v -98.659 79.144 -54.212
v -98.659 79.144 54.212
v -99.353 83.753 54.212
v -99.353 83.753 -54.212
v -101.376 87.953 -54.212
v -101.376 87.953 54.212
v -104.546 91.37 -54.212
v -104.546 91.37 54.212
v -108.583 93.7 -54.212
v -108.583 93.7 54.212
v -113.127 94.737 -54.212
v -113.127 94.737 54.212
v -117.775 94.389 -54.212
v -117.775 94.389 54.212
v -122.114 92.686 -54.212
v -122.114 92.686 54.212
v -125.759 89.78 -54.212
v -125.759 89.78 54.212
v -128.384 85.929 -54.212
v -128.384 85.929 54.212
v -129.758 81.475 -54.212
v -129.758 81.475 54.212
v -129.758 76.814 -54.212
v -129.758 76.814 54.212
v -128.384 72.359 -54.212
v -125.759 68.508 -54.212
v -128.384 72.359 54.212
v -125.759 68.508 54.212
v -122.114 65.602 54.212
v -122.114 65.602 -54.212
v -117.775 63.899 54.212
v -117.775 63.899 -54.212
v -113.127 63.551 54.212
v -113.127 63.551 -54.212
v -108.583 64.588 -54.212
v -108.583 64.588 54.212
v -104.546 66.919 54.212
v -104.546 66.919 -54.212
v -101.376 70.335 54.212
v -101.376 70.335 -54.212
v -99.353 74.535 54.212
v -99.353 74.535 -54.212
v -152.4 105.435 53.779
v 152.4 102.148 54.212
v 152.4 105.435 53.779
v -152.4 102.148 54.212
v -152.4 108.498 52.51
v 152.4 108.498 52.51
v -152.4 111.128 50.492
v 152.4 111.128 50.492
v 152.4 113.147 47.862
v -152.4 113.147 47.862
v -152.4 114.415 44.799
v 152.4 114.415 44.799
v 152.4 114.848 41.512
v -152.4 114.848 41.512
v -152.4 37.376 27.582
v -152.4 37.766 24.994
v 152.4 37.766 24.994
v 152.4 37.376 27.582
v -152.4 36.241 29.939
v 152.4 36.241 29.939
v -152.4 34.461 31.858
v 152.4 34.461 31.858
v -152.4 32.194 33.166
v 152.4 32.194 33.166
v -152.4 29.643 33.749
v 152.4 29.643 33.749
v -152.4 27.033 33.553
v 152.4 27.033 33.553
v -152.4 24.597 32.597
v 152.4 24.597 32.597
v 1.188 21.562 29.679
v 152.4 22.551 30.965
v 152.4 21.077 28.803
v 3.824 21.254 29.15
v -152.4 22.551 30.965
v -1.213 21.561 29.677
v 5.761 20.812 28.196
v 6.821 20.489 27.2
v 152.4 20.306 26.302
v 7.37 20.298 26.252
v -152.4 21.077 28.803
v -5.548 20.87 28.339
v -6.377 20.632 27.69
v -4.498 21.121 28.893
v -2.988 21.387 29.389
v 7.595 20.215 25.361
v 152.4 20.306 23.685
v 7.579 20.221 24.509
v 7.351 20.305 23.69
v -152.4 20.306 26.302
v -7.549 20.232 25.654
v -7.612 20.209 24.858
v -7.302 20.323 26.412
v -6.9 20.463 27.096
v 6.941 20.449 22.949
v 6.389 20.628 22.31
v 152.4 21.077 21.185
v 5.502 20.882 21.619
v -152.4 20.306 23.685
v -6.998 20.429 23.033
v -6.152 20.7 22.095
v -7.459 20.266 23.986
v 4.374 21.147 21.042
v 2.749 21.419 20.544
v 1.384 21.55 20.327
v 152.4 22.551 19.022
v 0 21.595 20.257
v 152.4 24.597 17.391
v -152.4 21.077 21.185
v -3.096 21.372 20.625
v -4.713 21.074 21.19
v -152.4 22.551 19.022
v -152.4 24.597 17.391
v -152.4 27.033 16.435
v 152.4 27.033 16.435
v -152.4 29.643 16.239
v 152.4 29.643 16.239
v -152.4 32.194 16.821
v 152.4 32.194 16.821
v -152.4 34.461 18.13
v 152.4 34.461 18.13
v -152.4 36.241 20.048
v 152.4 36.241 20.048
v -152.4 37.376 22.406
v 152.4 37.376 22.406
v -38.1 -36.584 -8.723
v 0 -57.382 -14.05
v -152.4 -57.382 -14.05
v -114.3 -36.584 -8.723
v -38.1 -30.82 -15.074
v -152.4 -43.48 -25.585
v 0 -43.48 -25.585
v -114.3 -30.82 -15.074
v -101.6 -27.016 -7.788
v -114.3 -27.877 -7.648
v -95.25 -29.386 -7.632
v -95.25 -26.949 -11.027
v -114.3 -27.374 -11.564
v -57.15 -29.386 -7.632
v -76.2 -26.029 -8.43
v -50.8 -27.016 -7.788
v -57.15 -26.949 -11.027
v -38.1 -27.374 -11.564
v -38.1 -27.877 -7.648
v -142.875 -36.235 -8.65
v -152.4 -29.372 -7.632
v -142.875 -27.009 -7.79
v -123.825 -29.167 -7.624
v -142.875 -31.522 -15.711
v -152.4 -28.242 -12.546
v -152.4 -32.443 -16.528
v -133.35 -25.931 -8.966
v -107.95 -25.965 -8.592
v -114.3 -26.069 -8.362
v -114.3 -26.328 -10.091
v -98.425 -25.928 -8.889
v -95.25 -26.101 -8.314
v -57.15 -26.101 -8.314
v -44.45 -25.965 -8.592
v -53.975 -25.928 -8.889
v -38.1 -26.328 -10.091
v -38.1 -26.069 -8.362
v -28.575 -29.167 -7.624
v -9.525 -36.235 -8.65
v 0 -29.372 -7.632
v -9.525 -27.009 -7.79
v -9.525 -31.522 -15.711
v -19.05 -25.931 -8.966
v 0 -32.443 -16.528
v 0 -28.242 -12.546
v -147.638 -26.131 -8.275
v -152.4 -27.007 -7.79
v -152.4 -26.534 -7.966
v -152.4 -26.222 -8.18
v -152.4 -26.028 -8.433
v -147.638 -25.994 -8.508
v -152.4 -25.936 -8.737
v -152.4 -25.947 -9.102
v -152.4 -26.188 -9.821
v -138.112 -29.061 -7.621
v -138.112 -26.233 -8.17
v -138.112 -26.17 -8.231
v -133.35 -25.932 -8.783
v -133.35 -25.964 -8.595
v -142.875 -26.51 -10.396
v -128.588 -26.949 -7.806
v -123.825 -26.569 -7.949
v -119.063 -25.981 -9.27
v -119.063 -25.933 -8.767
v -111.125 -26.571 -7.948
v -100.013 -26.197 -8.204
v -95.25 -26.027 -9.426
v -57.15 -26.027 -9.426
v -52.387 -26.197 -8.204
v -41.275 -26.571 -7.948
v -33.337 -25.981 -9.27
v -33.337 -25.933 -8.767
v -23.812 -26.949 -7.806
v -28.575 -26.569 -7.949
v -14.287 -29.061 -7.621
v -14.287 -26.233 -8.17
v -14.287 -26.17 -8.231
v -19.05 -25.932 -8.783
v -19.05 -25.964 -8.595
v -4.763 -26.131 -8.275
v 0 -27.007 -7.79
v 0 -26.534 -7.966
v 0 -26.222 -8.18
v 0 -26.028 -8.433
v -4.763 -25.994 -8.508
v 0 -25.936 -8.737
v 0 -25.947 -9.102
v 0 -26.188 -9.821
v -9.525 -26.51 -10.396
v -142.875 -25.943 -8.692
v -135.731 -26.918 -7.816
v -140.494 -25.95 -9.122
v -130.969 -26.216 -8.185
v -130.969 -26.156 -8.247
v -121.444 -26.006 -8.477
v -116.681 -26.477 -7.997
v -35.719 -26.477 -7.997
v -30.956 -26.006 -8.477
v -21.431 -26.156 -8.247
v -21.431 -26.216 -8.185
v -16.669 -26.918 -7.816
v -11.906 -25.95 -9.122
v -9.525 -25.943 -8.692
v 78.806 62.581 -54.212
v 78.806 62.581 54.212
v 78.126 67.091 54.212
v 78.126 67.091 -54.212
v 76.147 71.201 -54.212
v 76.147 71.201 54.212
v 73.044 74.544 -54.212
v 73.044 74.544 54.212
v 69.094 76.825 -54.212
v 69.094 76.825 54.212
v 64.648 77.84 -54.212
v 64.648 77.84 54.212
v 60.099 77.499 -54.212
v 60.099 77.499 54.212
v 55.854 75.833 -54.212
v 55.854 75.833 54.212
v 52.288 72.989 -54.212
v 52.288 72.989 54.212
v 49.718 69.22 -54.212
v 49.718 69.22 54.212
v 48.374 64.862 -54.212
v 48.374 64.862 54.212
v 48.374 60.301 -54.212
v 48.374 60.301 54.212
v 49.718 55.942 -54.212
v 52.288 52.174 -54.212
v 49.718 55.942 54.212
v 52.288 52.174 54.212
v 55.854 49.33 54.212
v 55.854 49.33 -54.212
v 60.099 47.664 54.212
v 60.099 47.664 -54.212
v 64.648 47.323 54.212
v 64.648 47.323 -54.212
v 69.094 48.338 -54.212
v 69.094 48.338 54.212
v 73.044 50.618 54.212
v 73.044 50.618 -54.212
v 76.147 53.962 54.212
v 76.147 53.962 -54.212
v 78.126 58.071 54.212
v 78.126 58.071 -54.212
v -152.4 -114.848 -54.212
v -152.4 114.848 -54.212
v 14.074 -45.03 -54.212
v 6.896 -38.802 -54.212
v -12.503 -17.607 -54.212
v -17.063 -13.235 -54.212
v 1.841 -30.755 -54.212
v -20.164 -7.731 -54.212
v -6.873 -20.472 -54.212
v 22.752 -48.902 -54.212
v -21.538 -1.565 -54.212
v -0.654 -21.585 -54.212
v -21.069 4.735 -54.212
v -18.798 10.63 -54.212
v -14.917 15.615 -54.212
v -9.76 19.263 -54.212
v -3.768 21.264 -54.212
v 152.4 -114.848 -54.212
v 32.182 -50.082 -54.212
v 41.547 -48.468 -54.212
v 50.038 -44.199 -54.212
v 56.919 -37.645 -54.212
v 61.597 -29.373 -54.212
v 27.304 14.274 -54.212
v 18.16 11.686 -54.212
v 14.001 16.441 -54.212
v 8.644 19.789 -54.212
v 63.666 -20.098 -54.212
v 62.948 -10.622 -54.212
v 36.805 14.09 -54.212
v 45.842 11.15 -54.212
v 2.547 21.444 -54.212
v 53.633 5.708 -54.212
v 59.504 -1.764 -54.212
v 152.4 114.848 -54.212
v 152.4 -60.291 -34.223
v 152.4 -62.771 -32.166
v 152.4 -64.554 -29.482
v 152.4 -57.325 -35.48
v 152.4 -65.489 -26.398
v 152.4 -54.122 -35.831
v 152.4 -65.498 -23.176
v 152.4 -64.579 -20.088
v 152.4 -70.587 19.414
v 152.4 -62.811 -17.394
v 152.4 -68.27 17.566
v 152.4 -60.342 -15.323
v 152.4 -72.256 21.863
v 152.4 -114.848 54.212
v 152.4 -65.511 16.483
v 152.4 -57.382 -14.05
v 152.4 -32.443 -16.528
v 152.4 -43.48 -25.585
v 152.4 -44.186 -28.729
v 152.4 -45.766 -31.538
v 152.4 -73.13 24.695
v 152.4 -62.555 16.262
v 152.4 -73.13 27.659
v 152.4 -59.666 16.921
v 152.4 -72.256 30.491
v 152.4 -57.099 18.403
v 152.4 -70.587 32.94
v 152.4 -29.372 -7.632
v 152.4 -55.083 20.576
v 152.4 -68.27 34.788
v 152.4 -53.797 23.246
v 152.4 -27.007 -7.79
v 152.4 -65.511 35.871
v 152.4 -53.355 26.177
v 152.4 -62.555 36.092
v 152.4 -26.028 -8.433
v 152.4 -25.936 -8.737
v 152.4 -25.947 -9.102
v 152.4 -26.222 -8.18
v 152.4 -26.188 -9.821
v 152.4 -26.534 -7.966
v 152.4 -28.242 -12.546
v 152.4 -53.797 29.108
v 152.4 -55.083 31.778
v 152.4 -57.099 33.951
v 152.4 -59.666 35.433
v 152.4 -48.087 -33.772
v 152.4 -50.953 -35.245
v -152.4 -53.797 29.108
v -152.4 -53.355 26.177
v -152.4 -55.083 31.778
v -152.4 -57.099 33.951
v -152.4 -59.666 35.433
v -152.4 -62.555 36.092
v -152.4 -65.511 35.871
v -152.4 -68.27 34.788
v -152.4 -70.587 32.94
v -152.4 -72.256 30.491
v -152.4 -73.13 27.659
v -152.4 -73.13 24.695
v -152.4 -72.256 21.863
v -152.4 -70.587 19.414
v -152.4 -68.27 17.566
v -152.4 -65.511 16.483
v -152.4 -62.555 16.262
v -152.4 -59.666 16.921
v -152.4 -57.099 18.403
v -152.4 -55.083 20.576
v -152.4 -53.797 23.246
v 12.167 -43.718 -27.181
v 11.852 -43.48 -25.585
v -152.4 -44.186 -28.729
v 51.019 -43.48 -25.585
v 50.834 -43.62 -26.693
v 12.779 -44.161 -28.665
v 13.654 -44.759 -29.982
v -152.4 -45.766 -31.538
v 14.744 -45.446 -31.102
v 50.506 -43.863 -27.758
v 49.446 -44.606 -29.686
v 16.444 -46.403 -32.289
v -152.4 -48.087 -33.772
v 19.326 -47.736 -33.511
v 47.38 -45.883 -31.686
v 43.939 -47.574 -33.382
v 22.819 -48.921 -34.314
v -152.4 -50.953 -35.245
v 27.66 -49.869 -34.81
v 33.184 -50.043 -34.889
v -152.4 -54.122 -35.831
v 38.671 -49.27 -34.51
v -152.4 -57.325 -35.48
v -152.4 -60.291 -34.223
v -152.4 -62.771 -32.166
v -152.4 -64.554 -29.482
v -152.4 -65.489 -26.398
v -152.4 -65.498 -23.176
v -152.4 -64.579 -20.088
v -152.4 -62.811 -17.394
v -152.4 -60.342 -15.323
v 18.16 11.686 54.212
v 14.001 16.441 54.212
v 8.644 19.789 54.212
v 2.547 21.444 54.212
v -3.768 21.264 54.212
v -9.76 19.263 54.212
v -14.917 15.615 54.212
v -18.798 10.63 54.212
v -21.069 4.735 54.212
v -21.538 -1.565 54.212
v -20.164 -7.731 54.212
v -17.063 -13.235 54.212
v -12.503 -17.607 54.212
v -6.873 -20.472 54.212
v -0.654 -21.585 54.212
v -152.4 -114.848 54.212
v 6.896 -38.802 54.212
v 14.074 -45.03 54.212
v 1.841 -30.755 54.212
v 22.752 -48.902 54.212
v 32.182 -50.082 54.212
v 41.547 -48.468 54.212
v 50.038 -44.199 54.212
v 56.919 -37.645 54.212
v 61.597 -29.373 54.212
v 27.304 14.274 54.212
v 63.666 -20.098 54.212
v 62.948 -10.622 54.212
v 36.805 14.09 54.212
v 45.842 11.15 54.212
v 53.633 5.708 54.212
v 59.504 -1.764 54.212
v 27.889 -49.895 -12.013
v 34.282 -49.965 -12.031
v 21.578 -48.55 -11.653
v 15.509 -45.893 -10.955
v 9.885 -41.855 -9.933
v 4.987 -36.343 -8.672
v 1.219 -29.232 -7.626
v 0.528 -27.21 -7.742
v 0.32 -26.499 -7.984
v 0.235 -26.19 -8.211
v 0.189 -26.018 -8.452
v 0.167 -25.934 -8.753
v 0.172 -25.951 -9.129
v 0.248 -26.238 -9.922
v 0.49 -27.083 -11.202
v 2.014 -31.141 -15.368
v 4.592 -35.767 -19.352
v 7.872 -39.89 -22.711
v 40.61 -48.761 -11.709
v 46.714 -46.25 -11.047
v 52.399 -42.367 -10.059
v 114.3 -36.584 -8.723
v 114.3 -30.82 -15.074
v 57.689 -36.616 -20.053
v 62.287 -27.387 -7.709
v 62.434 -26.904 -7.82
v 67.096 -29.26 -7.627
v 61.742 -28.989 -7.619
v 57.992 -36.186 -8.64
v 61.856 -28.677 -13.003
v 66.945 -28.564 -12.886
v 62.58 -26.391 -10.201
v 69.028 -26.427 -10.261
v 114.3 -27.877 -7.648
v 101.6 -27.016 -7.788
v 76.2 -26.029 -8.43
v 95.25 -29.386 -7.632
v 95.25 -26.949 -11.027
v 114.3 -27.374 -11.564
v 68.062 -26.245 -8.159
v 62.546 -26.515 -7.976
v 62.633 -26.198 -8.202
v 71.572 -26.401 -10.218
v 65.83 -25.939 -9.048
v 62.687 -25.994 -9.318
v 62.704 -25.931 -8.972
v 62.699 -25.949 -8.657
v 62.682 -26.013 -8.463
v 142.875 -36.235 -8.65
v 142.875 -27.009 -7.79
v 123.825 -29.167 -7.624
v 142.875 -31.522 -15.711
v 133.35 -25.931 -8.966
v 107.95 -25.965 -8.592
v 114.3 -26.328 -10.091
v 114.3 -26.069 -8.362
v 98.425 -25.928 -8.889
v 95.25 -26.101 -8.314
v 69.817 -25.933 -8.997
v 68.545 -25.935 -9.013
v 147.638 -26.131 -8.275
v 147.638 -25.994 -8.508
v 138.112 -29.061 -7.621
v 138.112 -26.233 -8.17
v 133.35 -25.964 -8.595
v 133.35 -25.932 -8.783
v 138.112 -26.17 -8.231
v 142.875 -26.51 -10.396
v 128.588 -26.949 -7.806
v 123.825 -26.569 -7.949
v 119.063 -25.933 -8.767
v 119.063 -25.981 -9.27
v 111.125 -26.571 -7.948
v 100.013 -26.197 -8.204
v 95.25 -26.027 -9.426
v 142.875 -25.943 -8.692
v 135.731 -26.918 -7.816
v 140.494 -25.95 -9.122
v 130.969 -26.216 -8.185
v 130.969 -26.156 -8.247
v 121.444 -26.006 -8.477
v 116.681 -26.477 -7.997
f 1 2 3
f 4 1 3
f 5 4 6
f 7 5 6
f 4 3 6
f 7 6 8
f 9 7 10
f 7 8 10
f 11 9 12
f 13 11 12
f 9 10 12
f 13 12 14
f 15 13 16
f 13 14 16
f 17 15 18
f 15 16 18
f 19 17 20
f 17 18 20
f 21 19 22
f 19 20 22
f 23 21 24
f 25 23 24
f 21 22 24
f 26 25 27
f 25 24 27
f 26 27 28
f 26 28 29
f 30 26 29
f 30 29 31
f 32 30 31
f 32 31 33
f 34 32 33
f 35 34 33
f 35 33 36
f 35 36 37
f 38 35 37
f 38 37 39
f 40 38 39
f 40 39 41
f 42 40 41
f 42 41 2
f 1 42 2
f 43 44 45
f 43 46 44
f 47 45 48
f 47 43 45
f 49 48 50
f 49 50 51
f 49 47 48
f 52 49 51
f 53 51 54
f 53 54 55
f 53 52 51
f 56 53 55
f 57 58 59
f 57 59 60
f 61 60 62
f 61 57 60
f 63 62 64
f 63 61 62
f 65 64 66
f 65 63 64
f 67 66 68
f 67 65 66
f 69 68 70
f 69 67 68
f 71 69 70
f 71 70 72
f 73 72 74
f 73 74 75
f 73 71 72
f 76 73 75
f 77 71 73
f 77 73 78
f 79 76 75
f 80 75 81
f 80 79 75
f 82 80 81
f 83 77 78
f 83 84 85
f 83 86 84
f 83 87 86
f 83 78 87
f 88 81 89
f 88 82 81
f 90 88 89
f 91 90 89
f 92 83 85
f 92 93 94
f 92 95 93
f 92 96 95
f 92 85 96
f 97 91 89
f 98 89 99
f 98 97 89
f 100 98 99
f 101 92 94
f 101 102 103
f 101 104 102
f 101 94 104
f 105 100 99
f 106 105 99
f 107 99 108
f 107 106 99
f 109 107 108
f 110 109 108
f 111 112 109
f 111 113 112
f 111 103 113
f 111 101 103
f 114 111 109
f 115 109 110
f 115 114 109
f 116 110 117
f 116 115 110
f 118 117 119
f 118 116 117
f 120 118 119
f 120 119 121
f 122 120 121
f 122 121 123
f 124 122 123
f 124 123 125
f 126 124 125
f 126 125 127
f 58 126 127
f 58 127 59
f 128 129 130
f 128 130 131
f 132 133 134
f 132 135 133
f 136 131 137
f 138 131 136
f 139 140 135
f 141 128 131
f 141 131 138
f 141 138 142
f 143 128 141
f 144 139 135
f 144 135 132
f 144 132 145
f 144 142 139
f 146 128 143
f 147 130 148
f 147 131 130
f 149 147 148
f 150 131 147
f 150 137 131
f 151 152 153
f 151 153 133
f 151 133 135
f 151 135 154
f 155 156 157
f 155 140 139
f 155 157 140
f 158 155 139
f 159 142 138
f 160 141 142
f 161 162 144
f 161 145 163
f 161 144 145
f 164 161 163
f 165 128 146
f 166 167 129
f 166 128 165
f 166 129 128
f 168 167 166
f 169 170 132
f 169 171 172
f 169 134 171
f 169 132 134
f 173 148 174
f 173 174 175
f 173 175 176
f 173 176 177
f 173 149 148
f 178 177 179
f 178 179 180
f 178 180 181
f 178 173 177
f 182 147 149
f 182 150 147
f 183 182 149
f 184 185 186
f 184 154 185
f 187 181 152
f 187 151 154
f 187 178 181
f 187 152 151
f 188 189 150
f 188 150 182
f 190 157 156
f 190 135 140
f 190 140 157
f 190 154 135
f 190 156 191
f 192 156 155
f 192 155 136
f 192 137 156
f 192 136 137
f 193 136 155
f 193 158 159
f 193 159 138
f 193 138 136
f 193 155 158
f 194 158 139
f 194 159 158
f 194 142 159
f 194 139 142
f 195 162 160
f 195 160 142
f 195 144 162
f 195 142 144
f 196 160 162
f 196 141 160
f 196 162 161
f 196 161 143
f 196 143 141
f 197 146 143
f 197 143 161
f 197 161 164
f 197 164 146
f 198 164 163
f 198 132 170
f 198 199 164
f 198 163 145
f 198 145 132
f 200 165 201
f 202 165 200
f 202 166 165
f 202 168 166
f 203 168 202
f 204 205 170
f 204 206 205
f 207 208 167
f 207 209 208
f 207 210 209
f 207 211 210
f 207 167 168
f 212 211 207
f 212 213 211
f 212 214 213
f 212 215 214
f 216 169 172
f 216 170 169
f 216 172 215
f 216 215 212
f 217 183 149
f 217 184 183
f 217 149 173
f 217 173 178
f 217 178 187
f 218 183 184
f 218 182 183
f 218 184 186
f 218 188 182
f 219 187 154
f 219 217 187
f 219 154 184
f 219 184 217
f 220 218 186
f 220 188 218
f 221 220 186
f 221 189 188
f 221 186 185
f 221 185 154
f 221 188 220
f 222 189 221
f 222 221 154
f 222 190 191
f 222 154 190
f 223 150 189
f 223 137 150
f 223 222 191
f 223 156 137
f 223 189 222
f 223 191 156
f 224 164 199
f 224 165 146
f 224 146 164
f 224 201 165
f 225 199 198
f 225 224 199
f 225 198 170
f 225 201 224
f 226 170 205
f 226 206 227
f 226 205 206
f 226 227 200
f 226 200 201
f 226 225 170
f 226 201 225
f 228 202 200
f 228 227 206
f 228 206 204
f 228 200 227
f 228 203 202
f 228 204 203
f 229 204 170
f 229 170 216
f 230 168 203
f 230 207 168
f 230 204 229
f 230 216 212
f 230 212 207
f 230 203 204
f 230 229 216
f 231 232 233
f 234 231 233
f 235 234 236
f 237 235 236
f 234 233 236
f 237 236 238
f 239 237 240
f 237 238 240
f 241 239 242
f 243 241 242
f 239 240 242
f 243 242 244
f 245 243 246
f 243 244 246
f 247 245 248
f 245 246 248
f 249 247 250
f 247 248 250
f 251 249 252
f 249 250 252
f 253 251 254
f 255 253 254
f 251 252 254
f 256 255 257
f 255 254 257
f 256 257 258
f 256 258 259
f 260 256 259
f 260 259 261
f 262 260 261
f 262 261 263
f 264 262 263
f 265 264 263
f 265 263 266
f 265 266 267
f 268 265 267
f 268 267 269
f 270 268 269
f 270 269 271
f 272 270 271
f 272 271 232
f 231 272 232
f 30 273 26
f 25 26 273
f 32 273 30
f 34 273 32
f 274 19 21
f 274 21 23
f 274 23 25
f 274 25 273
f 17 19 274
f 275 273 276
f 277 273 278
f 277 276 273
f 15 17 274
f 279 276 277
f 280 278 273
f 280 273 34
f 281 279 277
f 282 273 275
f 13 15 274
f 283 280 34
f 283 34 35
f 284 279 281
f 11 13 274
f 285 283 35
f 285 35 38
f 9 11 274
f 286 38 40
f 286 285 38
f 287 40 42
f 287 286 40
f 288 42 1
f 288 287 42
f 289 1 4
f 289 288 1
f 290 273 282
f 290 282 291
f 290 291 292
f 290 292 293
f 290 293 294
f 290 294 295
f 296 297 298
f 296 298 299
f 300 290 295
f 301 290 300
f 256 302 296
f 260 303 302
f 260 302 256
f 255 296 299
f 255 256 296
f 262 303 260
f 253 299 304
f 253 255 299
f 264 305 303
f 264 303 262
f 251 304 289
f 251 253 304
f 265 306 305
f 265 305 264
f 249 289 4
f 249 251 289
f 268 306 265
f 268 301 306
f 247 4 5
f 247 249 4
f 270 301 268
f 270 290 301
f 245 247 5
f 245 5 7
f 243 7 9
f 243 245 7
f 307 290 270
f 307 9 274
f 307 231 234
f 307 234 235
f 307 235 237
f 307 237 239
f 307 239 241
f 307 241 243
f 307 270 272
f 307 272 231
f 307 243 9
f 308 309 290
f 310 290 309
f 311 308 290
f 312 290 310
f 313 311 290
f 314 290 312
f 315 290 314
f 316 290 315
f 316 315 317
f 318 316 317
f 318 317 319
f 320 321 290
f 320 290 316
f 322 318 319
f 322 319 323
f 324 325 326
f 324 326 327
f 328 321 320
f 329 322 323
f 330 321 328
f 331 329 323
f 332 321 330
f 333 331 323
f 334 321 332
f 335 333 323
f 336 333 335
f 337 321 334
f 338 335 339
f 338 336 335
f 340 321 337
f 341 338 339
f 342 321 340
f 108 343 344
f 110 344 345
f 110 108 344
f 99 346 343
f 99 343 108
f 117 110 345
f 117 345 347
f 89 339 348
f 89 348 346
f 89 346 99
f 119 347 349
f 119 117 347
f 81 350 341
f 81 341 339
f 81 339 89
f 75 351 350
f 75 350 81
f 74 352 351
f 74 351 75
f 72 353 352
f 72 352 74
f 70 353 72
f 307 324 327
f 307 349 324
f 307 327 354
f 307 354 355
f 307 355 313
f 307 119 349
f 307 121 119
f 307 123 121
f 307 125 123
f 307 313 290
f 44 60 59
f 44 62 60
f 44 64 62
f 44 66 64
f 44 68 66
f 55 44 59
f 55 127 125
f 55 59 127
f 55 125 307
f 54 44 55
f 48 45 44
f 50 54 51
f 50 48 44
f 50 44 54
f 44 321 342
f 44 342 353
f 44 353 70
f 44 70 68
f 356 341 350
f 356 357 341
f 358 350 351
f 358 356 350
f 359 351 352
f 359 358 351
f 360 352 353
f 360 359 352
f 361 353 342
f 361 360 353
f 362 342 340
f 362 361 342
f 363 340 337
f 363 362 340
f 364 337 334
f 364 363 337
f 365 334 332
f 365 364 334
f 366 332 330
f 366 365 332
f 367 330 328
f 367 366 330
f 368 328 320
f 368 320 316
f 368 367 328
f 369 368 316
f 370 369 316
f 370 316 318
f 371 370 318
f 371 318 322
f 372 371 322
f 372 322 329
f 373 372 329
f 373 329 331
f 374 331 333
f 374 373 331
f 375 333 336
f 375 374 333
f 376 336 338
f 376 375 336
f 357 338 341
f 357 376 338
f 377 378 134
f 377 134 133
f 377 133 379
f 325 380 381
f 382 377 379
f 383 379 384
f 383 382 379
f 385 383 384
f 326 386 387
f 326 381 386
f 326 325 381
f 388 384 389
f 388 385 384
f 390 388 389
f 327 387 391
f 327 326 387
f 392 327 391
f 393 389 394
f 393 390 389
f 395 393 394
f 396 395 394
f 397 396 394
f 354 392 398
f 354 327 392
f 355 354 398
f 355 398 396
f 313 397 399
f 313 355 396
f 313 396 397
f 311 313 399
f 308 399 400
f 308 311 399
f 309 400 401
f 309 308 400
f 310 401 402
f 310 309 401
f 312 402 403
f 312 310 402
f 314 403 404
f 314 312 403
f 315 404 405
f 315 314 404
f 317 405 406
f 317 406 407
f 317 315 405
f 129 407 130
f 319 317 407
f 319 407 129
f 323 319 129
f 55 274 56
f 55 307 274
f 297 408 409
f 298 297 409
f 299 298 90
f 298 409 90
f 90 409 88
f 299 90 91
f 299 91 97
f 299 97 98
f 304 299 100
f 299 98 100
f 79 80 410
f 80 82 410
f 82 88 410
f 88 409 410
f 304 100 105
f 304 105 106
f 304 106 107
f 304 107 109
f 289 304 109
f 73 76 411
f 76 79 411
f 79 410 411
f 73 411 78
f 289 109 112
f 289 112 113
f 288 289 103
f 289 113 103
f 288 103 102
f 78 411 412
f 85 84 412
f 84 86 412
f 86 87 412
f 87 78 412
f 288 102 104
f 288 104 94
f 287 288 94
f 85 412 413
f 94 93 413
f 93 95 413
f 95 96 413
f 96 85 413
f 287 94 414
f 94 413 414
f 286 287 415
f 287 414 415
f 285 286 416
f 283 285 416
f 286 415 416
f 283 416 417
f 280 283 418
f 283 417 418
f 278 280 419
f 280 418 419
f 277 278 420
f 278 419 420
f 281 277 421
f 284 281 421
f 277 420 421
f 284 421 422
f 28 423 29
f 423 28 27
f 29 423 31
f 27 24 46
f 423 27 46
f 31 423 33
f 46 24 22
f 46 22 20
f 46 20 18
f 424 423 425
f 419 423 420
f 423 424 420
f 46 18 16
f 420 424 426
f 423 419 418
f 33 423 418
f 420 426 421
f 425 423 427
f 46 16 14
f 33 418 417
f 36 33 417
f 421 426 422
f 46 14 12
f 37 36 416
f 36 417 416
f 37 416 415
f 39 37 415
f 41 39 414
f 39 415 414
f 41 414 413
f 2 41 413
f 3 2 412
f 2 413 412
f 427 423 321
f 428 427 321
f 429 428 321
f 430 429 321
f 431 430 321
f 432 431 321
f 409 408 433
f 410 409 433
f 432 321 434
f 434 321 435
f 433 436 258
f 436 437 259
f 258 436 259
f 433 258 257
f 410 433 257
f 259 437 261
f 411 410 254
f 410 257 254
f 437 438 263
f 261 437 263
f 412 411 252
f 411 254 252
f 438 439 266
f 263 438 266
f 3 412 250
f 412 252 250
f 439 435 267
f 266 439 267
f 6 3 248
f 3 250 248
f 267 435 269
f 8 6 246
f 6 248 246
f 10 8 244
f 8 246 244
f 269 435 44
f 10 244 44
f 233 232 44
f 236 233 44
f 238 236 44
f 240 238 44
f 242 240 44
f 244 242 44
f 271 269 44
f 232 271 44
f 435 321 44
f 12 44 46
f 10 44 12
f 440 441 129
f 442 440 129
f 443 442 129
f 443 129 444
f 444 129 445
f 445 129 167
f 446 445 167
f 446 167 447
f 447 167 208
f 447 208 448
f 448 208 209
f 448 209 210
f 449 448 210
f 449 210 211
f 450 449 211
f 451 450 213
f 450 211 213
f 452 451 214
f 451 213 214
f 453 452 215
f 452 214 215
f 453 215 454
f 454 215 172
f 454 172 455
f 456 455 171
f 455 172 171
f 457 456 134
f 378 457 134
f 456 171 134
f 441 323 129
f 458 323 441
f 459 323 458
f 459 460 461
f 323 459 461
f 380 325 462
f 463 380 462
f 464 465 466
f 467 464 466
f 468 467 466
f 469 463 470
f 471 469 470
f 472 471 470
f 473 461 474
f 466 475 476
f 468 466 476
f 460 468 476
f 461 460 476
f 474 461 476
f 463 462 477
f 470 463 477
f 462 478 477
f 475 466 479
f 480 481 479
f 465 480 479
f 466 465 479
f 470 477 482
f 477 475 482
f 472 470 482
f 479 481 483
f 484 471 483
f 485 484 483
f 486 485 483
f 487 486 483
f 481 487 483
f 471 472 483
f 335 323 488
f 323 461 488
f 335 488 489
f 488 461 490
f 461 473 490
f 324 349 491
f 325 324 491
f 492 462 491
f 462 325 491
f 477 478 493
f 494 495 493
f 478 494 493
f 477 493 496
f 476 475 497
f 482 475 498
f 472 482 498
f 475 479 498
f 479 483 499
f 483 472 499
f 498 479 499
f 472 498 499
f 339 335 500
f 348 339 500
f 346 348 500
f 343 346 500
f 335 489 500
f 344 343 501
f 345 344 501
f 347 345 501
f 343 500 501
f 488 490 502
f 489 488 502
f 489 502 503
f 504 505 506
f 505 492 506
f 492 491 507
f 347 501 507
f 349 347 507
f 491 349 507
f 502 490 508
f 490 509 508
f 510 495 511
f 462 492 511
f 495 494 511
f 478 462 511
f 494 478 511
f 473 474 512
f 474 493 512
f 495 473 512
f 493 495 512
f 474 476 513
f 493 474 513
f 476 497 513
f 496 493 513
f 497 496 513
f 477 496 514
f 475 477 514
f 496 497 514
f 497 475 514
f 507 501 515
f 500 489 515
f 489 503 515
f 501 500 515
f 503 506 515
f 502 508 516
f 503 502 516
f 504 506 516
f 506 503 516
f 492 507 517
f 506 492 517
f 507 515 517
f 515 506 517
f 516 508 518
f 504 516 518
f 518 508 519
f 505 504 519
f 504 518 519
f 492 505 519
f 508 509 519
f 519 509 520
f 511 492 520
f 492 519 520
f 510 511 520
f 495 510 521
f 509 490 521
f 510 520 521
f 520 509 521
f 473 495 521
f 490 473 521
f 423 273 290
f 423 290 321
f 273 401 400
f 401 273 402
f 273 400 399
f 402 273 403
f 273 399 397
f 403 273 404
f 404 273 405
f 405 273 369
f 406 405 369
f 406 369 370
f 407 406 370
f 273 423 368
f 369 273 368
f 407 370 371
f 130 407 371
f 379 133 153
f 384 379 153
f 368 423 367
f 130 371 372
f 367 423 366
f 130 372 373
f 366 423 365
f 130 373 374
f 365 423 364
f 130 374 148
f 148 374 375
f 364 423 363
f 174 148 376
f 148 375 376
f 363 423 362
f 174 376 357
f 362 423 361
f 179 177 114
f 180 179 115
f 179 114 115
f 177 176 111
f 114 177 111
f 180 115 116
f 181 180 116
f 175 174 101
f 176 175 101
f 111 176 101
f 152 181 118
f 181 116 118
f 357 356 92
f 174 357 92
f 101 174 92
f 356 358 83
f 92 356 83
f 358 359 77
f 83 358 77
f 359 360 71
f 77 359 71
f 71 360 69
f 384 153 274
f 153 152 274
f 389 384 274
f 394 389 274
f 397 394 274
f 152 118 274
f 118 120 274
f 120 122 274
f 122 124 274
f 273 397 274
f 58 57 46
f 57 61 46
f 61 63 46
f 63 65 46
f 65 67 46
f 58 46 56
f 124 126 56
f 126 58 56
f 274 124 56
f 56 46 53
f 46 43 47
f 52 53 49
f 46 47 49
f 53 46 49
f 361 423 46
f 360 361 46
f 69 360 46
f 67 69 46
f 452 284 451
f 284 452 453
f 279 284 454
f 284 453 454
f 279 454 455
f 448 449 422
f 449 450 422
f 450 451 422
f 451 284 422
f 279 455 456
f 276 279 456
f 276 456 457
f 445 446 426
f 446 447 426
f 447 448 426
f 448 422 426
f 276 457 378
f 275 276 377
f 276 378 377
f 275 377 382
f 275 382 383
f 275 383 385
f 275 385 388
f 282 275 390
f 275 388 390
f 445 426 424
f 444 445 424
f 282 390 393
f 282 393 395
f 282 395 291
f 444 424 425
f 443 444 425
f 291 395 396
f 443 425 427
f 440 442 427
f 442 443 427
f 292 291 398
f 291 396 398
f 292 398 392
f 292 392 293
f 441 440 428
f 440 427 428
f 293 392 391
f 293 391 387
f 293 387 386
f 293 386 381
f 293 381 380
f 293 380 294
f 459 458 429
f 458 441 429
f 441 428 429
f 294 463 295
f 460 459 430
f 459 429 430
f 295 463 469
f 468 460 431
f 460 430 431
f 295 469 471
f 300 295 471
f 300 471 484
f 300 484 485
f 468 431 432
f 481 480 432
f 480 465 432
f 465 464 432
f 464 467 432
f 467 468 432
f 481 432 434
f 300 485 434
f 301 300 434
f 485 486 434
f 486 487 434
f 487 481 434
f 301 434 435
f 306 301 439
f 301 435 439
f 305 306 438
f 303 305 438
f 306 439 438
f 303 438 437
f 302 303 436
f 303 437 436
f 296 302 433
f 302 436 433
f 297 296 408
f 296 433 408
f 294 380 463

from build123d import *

# Parameters (mm, degrees)
F0_W     = 229.6963825016
F0_H     = 108.4231149972
F0_R     = 9.942969978
F0_R_2   = 8.7794022154
F1_DEPTH = 152.4
F2_R     = 15.637009349
F2_R_2   = 15.3013139209
F3_DEPTH = 108.4241150972
F4_R     = 12.7


with BuildPart() as f1:
    # F0 (on Right) → F1 (new body, symmetric)
    with BuildSketch(Plane.YZ):
        Rectangle(F0_W, F0_H)
        with BuildLine():
            ThreePointArc((-43.4804819524, -25.5854520947), (-61.6064477727, -33.2849477454), (-57.3824048042, -14.049815014))
            add(Edge.make_bspline(
                [(-57.3824048042, -14.049815014), (-42.3782414018, -9.9389745723), (-14.222776702, -2.224940818), (-34.1653761162, -18.1479024622), (-43.4804819524, -25.5854520947)],
                knots=[0, 0, 0, 0, 0.5329041294, 1, 1, 1, 1], degree=3))
        make_face(mode=Mode.SUBTRACT)
        with Locations((-63.2981136441, 26.1770226061)):
            Circle(F0_R, mode=Mode.SUBTRACT)
        with Locations((28.9869904518, 24.9938834459)):
            Circle(F0_R_2, mode=Mode.SUBTRACT)
    extrude(amount=F1_DEPTH, both=True)

    # F2 (on face) → F3 (cut, through all)
    with BuildSketch(Plane.XY.offset(54.2115574986)):
        with Locations((-114.2957806332, 79.1441154076)):
            Circle(F2_R)
        with Locations((63.5042193668, 62.5812566792)):
            Circle(F2_R_2)
        with BuildLine():
            ThreePointArc((-0.654293087, -21.5848963512), (33.3430248824, -50.0341097243), (63.7498454838, -17.775767678))
            ThreePointArc((63.7498454838, -17.775767678), (48.9743135647, 9.3649362096), (18.1596027821, 11.6860890263))
            ThreePointArc((18.1596027821, 11.6860890263), (20.7182170411, 6.0902653943), (21.5948107177, 0))
            ThreePointArc((21.5948107177, 0), (15.0367302723, -15.4994384625), (-0.654293087, -21.5848963512))
        make_face()
        with BuildLine():
            ThreePointArc((21.5948107177, 0), (20.7182170411, 6.0902653943), (18.1596027821, 11.6860890263))
            ThreePointArc((18.1596027821, 11.6860890263), (3.3062432367, -1.8695964447), (-0.654293087, -21.5848963512))
            ThreePointArc((-0.654293087, -21.5848963512), (15.0367302723, -15.4994384625), (21.5948107177, 0))
        make_face()
        with BuildLine():
            ThreePointArc((-0.654293087, -21.5848963512), (3.3062432367, -1.8695964447), (18.1596027821, 11.6860890263))
            ThreePointArc((18.1596027821, 11.6860890263), (-18.7975685629, 10.6295468416), (-0.654293087, -21.5848963512))
        make_face()
    extrude(amount=-F3_DEPTH, mode=Mode.SUBTRACT)

    # F4
    f4_edges = [f1.edges().sort_by_distance(p)[0] for p in [
        (0, 114.848191, 54.211557),
    ]]
    fillet(f4_edges, radius=F4_R)


solid = f1.part
